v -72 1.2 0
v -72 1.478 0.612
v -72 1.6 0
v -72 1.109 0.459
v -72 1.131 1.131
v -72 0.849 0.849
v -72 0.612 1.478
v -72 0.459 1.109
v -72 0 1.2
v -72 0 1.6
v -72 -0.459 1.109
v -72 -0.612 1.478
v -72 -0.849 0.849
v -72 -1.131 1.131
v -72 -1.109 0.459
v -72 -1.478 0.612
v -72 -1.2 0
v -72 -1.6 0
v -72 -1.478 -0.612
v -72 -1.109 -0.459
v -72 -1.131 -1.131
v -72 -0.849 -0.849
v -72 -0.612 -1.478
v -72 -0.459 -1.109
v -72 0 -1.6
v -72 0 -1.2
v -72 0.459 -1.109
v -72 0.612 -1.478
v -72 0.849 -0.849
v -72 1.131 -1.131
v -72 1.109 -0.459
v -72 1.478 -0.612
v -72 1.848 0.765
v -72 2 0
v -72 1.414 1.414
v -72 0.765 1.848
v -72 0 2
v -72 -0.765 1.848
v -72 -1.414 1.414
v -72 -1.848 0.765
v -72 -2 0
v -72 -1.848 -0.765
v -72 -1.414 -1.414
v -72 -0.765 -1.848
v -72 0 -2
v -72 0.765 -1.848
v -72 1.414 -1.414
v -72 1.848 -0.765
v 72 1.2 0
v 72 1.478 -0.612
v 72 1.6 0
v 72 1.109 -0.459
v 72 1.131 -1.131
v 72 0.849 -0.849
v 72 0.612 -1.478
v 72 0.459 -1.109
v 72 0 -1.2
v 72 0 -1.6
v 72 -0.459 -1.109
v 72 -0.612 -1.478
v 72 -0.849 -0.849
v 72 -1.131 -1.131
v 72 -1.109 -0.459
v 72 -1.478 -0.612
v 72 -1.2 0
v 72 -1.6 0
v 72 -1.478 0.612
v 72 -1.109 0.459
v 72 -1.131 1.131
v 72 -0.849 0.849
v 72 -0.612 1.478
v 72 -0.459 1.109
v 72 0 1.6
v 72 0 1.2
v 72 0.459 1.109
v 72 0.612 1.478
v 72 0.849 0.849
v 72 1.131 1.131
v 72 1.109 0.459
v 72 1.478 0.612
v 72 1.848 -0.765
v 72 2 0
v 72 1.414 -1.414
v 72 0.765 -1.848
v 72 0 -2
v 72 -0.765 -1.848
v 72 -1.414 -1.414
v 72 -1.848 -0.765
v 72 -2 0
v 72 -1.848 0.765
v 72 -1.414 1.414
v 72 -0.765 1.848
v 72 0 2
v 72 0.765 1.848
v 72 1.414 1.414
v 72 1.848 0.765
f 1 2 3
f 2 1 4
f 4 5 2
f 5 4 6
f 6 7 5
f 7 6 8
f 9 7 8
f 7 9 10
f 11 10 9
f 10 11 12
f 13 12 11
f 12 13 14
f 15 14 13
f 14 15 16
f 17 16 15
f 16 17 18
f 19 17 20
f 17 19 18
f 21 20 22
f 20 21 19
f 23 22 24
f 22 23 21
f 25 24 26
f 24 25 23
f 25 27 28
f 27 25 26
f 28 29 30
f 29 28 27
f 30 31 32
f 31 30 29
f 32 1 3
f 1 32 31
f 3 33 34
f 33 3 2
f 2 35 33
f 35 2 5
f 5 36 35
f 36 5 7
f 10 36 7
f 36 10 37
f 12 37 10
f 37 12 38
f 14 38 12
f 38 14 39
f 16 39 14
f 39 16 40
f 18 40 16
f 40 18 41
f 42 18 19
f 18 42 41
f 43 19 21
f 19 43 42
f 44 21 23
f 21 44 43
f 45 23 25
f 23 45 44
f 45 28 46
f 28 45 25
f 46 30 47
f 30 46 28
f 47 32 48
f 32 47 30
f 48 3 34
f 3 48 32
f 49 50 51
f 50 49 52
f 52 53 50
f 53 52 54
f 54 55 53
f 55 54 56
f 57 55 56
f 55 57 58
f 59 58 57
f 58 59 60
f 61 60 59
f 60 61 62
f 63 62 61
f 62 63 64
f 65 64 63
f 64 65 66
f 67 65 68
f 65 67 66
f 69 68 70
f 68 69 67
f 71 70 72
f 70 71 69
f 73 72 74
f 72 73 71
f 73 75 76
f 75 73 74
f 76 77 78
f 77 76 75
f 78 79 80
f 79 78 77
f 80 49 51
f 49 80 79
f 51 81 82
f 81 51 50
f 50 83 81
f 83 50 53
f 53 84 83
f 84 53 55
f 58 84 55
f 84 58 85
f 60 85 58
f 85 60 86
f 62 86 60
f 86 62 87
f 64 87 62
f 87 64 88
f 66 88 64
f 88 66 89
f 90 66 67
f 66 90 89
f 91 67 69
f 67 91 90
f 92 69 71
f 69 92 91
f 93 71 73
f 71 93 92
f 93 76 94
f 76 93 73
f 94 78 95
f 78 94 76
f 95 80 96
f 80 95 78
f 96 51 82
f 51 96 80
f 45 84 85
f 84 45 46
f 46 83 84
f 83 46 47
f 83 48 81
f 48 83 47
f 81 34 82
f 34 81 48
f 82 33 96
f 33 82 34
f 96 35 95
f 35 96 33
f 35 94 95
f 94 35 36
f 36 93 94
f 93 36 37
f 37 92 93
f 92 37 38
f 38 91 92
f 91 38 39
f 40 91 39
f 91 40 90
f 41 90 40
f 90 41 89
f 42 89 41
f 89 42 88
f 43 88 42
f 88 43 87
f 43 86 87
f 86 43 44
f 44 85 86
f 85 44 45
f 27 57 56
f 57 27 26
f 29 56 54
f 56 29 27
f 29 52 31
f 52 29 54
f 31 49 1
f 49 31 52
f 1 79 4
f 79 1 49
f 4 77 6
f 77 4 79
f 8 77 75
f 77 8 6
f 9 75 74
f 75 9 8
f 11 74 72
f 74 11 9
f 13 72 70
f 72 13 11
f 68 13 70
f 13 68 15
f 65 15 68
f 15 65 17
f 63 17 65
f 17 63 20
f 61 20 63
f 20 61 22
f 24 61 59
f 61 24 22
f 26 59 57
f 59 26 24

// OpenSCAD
// file: ../p/4-4cyli.scad
use <../lib.scad>
function ldraw_lib__4_4cyli() = [
// 0 Cylinder 1.0
// 0 Name: 4-4cyli.dat
// 0 Author: James Jessiman
// 0 !LDRAW_ORG Primitive UPDATE 2005-01
// 0 !LICENSE Licensed under CC BY 4.0 : see CAreadme.txt
// 
// 0 BFC CERTIFY CCW
  [0,"BFC","CERTIFY"],
  [0,"BFC","CCW"],
// 
// 0 !HISTORY 1998-12-15 [PTadmin] Official Update 1998-10
// 0 !HISTORY 2002-03-23 [sbliss] Added BFC statement; merged headers from files in distributions LDraw 0.27 and Complete.
// 0 !HISTORY 2002-04-25 [PTadmin] Official Update 2002-02
// 0 !HISTORY 2004-12-14 [guyvivan] BFC CCW
// 0 !HISTORY 2005-12-28 [PTadmin] Official Update 2005-01
// 0 !HISTORY 2007-06-24 [PTadmin] Header formatted for Contributor Agreement
// 0 !HISTORY 2008-07-01 [PTadmin] Official Update 2008-01
// 
// 
// 4 16 1 1 0 0.9239 1 0.3827 0.9239 0 0.3827 1 0 0
  [4,16,1,1,0,0.9239,1,0.3827,0.9239,0,0.3827,1,0,0],
// 5 24 1 0 0 1 1 0 0.9239 0 0.3827 0.9239 0 -0.3827
  [5,24,1,0,0,1,1,0,0.9239,0,0.3827,0.9239,0,-0.3827],
// 4 16 0.9239 1 0.3827 0.7071 1 0.7071 0.7071 0 0.7071 0.9239 0 0.3827
  [4,16,0.9239,1,0.3827,0.7071,1,0.7071,0.7071,0,0.7071,0.9239,0,0.3827],
// 5 24 0.9239 0 0.3827 0.9239 1 0.3827 0.7071 0 0.7071 1 0 0
  [5,24,0.9239,0,0.3827,0.9239,1,0.3827,0.7071,0,0.7071,1,0,0],
// 4 16 0.7071 1 0.7071 0.3827 1 0.9239 0.3827 0 0.9239 0.7071 0 0.7071
  [4,16,0.7071,1,0.7071,0.3827,1,0.9239,0.3827,0,0.9239,0.7071,0,0.7071],
// 5 24 0.7071 0 0.7071 0.7071 1 0.7071 0.3827 0 0.9239 0.9239 0 0.3827
  [5,24,0.7071,0,0.7071,0.7071,1,0.7071,0.3827,0,0.9239,0.9239,0,0.3827],
// 4 16 0.3827 1 0.9239 0 1 1 0 0 1 0.3827 0 0.9239
  [4,16,0.3827,1,0.9239,0,1,1,0,0,1,0.3827,0,0.9239],
// 5 24 0.3827 0 0.9239 0.3827 1 0.9239 0 0 1 0.7071 0 0.7071
  [5,24,0.3827,0,0.9239,0.3827,1,0.9239,0,0,1,0.7071,0,0.7071],
// 4 16 0 1 1 -0.3827 1 0.9239 -0.3827 0 0.9239 0 0 1
  [4,16,0,1,1,-0.3827,1,0.9239,-0.3827,0,0.9239,0,0,1],
// 5 24 0 0 1 0 1 1 -0.3827 0 0.9239 0.3827 0 0.9239
  [5,24,0,0,1,0,1,1,-0.3827,0,0.9239,0.3827,0,0.9239],
// 4 16 -0.3827 1 0.9239 -0.7071 1 0.7071 -0.7071 0 0.7071 -0.3827 0 0.9239
  [4,16,-0.3827,1,0.9239,-0.7071,1,0.7071,-0.7071,0,0.7071,-0.3827,0,0.9239],
// 5 24 -0.3827 0 0.9239 -0.3827 1 0.9239 -0.7071 0 0.7071 0 0 1
  [5,24,-0.3827,0,0.9239,-0.3827,1,0.9239,-0.7071,0,0.7071,0,0,1],
// 4 16 -0.7071 1 0.7071 -0.9239 1 0.3827 -0.9239 0 0.3827 -0.7071 0 0.7071
  [4,16,-0.7071,1,0.7071,-0.9239,1,0.3827,-0.9239,0,0.3827,-0.7071,0,0.7071],
// 5 24 -0.7071 0 0.7071 -0.7071 1 0.7071 -0.9239 0 0.3827 -0.3827 0 0.9239
  [5,24,-0.7071,0,0.7071,-0.7071,1,0.7071,-0.9239,0,0.3827,-0.3827,0,0.9239],
// 4 16 -0.9239 1 0.3827 -1 1 0 -1 0 0 -0.9239 0 0.3827
  [4,16,-0.9239,1,0.3827,-1,1,0,-1,0,0,-0.9239,0,0.3827],
// 5 24 -0.9239 0 0.3827 -0.9239 1 0.3827 -1 0 0 -0.7071 0 0.7071
  [5,24,-0.9239,0,0.3827,-0.9239,1,0.3827,-1,0,0,-0.7071,0,0.7071],
// 4 16 -1 1 0 -0.9239 1 -0.3827 -0.9239 0 -0.3827 -1 0 0
  [4,16,-1,1,0,-0.9239,1,-0.3827,-0.9239,0,-0.3827,-1,0,0],
// 5 24 -1 0 0 -1 1 0 -0.9239 0 -0.3827 -0.9239 0 0.3827
  [5,24,-1,0,0,-1,1,0,-0.9239,0,-0.3827,-0.9239,0,0.3827],
// 4 16 -0.9239 1 -0.3827 -0.7071 1 -0.7071 -0.7071 0 -0.7071 -0.9239 0 -0.3827
  [4,16,-0.9239,1,-0.3827,-0.7071,1,-0.7071,-0.7071,0,-0.7071,-0.9239,0,-0.3827],
// 5 24 -0.9239 0 -0.3827 -0.9239 1 -0.3827 -0.7071 0 -0.7071 -1 0 0
  [5,24,-0.9239,0,-0.3827,-0.9239,1,-0.3827,-0.7071,0,-0.7071,-1,0,0],
// 4 16 -0.7071 1 -0.7071 -0.3827 1 -0.9239 -0.3827 0 -0.9239 -0.7071 0 -0.7071
  [4,16,-0.7071,1,-0.7071,-0.3827,1,-0.9239,-0.3827,0,-0.9239,-0.7071,0,-0.7071],
// 5 24 -0.7071 0 -0.7071 -0.7071 1 -0.7071 -0.3827 0 -0.9239 -0.9239 0 -0.3827
  [5,24,-0.7071,0,-0.7071,-0.7071,1,-0.7071,-0.3827,0,-0.9239,-0.9239,0,-0.3827],
// 4 16 -0.3827 1 -0.9239 0 1 -1 0 0 -1 -0.3827 0 -0.9239
  [4,16,-0.3827,1,-0.9239,0,1,-1,0,0,-1,-0.3827,0,-0.9239],
// 5 24 -0.3827 0 -0.9239 -0.3827 1 -0.9239 0 0 -1 -0.7071 0 -0.7071
  [5,24,-0.3827,0,-0.9239,-0.3827,1,-0.9239,0,0,-1,-0.7071,0,-0.7071],
// 4 16 0 1 -1 0.3827 1 -0.9239 0.3827 0 -0.9239 0 0 -1
  [4,16,0,1,-1,0.3827,1,-0.9239,0.3827,0,-0.9239,0,0,-1],
// 5 24 0 0 -1 0 1 -1 0.3827 0 -0.9239 -0.3827 0 -0.9239
  [5,24,0,0,-1,0,1,-1,0.3827,0,-0.9239,-0.3827,0,-0.9239],
// 4 16 0.3827 1 -0.9239 0.7071 1 -0.7071 0.7071 0 -0.7071 0.3827 0 -0.9239
  [4,16,0.3827,1,-0.9239,0.7071,1,-0.7071,0.7071,0,-0.7071,0.3827,0,-0.9239],
// 5 24 0.3827 0 -0.9239 0.3827 1 -0.9239 0.7071 0 -0.7071 0 0 -1
  [5,24,0.3827,0,-0.9239,0.3827,1,-0.9239,0.7071,0,-0.7071,0,0,-1],
// 4 16 0.7071 1 -0.7071 0.9239 1 -0.3827 0.9239 0 -0.3827 0.7071 0 -0.7071
  [4,16,0.7071,1,-0.7071,0.9239,1,-0.3827,0.9239,0,-0.3827,0.7071,0,-0.7071],
// 5 24 0.7071 0 -0.7071 0.7071 1 -0.7071 0.9239 0 -0.3827 0.3827 0 -0.9239
  [5,24,0.7071,0,-0.7071,0.7071,1,-0.7071,0.9239,0,-0.3827,0.3827,0,-0.9239],
// 4 16 0.9239 1 -0.3827 1 1 0 1 0 0 0.9239 0 -0.3827
  [4,16,0.9239,1,-0.3827,1,1,0,1,0,0,0.9239,0,-0.3827],
// 5 24 0.9239 0 -0.3827 0.9239 1 -0.3827 1 0 0 0.7071 0 -0.7071
  [5,24,0.9239,0,-0.3827,0.9239,1,-0.3827,1,0,0,0.7071,0,-0.7071],
// 0
];
module ldraw_lib__4_4cyli(step=0, col=false, unit=2/5, alt=false, line=0.2, solid=!$preview)
    makepoly(ldraw_lib__4_4cyli(), step=step, col=col, unit=unit, alt=alt, line=line, solid=solid);
ldraw_lib__4_4cyli(line=0.2);
// file: ../p/4-4ring4.scad
use <../lib.scad>
function ldraw_lib__4_4ring4() = [
// 0 Ring  4 x 1.0
// 0 Name: 4-4ring4.dat
// 0 Author: James Jessiman
// 0 !LDRAW_ORG Primitive UPDATE 2009-01
// 0 !LICENSE Licensed under CC BY 4.0 : see CAreadme.txt
// 
// 0 BFC CERTIFY CCW
  [0,"BFC","CERTIFY"],
  [0,"BFC","CCW"],
// 
// 0 !HISTORY 1998-12-15 [PTadmin] Official Update 1998-10
// 0 !HISTORY 2002-04-08 [BrickCaster] Modified for BFC compliance
// 0 !HISTORY 2002-04-25 [PTadmin] Official Update 2002-02
// 0 !HISTORY 2007-06-24 [PTadmin] Header formatted for Contributor Agreement
// 0 !HISTORY 2008-07-01 [PTadmin] Official Update 2008-01
// 0 !HISTORY 2008-08-26 [cwdee] Switch polygon winding and rename
// 0 !HISTORY 2009-05-02 [PTadmin] Official Update 2009-01
// 
// 
// 4 16 -1.9135 0 4.6195 -1.5308 0 3.6956 0 0 4 0 0 5
  [4,16,-1.9135,0,4.6195,-1.5308,0,3.6956,0,0,4,0,0,5],
// 4 16 -3.5355 0 3.5355 -2.8284 0 2.8284 -1.5308 0 3.6956 -1.9135 0 4.6195
  [4,16,-3.5355,0,3.5355,-2.8284,0,2.8284,-1.5308,0,3.6956,-1.9135,0,4.6195],
// 4 16 -4.6195 0 1.9135 -3.6956 0 1.5308 -2.8284 0 2.8284 -3.5355 0 3.5355
  [4,16,-4.6195,0,1.9135,-3.6956,0,1.5308,-2.8284,0,2.8284,-3.5355,0,3.5355],
// 4 16 -5 0 0 -4 0 0 -3.6956 0 1.5308 -4.6195 0 1.9135
  [4,16,-5,0,0,-4,0,0,-3.6956,0,1.5308,-4.6195,0,1.9135],
// 4 16 -4.6195 0 -1.9135 -3.6956 0 -1.5308 -4 0 0 -5 0 0
  [4,16,-4.6195,0,-1.9135,-3.6956,0,-1.5308,-4,0,0,-5,0,0],
// 4 16 -3.5355 0 -3.5355 -2.8284 0 -2.8284 -3.6956 0 -1.5308 -4.6195 0 -1.9135
  [4,16,-3.5355,0,-3.5355,-2.8284,0,-2.8284,-3.6956,0,-1.5308,-4.6195,0,-1.9135],
// 4 16 -1.9135 0 -4.6195 -1.5308 0 -3.6956 -2.8284 0 -2.8284 -3.5355 0 -3.5355
  [4,16,-1.9135,0,-4.6195,-1.5308,0,-3.6956,-2.8284,0,-2.8284,-3.5355,0,-3.5355],
// 4 16 0 0 -5 0 0 -4 -1.5308 0 -3.6956 -1.9135 0 -4.6195
  [4,16,0,0,-5,0,0,-4,-1.5308,0,-3.6956,-1.9135,0,-4.6195],
// 4 16 1.9135 0 -4.6195 1.5308 0 -3.6956 0 0 -4 0 0 -5
  [4,16,1.9135,0,-4.6195,1.5308,0,-3.6956,0,0,-4,0,0,-5],
// 4 16 3.5355 0 -3.5355 2.8284 0 -2.8284 1.5308 0 -3.6956 1.9135 0 -4.6195
  [4,16,3.5355,0,-3.5355,2.8284,0,-2.8284,1.5308,0,-3.6956,1.9135,0,-4.6195],
// 4 16 4.6195 0 -1.9135 3.6956 0 -1.5308 2.8284 0 -2.8284 3.5355 0 -3.5355
  [4,16,4.6195,0,-1.9135,3.6956,0,-1.5308,2.8284,0,-2.8284,3.5355,0,-3.5355],
// 4 16 5 0 0 4 0 0 3.6956 0 -1.5308 4.6195 0 -1.9135
  [4,16,5,0,0,4,0,0,3.6956,0,-1.5308,4.6195,0,-1.9135],
// 4 16 4.6195 0 1.9135 3.6956 0 1.5308 4 0 0 5 0 0
  [4,16,4.6195,0,1.9135,3.6956,0,1.5308,4,0,0,5,0,0],
// 4 16 3.5355 0 3.5355 2.8284 0 2.8284 3.6956 0 1.5308 4.6195 0 1.9135
  [4,16,3.5355,0,3.5355,2.8284,0,2.8284,3.6956,0,1.5308,4.6195,0,1.9135],
// 4 16 1.9135 0 4.6195 1.5308 0 3.6956 2.8284 0 2.8284 3.5355 0 3.5355
  [4,16,1.9135,0,4.6195,1.5308,0,3.6956,2.8284,0,2.8284,3.5355,0,3.5355],
// 4 16 0 0 5 0 0 4 1.5308 0 3.6956 1.9135 0 4.6195
  [4,16,0,0,5,0,0,4,1.5308,0,3.6956,1.9135,0,4.6195],
// 0
];
module ldraw_lib__4_4ring4(step=0, col=false, unit=2/5, alt=false, line=0.2, solid=!$preview)
    makepoly(ldraw_lib__4_4ring4(), step=step, col=col, unit=unit, alt=alt, line=line, solid=solid);
ldraw_lib__4_4ring4(line=0.2);
// file: ../p/4-4ring3.scad
use <../lib.scad>
function ldraw_lib__4_4ring3() = [
// 0 Ring  3 x 1.0
// 0 Name: 4-4ring3.dat
// 0 Author: James Jessiman
// 0 !LDRAW_ORG Primitive UPDATE 2009-01
// 0 !LICENSE Licensed under CC BY 4.0 : see CAreadme.txt
// 
// 0 BFC CERTIFY CCW
  [0,"BFC","CERTIFY"],
  [0,"BFC","CCW"],
// 
// 0 !HISTORY 1998-12-15 [PTadmin] Official Update 1998-10
// 0 !HISTORY 2002-04-05 [hafhead] Added BFC statement
// 0 !HISTORY 2002-04-25 [PTadmin] Official Update 2002-02
// 0 !HISTORY 2007-06-24 [PTadmin] Header formatted for Contributor Agreement
// 0 !HISTORY 2008-07-01 [PTadmin] Official Update 2008-01
// 0 !HISTORY 2008-08-26 [cwdee] Switch polygon winding and rename
// 0 !HISTORY 2009-05-02 [PTadmin] Official Update 2009-01
// 
// 
// 4 16 -1.5308 0 3.6956 -1.1481 0 2.7717 0 0 3 0 0 4
  [4,16,-1.5308,0,3.6956,-1.1481,0,2.7717,0,0,3,0,0,4],
// 4 16 -2.8284 0 2.8284 -2.1213 0 2.1213 -1.1481 0 2.7717 -1.5308 0 3.6956
  [4,16,-2.8284,0,2.8284,-2.1213,0,2.1213,-1.1481,0,2.7717,-1.5308,0,3.6956],
// 4 16 -3.6956 0 1.5308 -2.7717 0 1.1481 -2.1213 0 2.1213 -2.8284 0 2.8284
  [4,16,-3.6956,0,1.5308,-2.7717,0,1.1481,-2.1213,0,2.1213,-2.8284,0,2.8284],
// 4 16 -4 0 0 -3 0 0 -2.7717 0 1.1481 -3.6956 0 1.5308
  [4,16,-4,0,0,-3,0,0,-2.7717,0,1.1481,-3.6956,0,1.5308],
// 4 16 -3.6956 0 -1.5308 -2.7717 0 -1.1481 -3 0 0 -4 0 0
  [4,16,-3.6956,0,-1.5308,-2.7717,0,-1.1481,-3,0,0,-4,0,0],
// 4 16 -2.8284 0 -2.8284 -2.1213 0 -2.1213 -2.7717 0 -1.1481 -3.6956 0 -1.5308
  [4,16,-2.8284,0,-2.8284,-2.1213,0,-2.1213,-2.7717,0,-1.1481,-3.6956,0,-1.5308],
// 4 16 -1.5308 0 -3.6956 -1.1481 0 -2.7717 -2.1213 0 -2.1213 -2.8284 0 -2.8284
  [4,16,-1.5308,0,-3.6956,-1.1481,0,-2.7717,-2.1213,0,-2.1213,-2.8284,0,-2.8284],
// 4 16 0 0 -4 0 0 -3 -1.1481 0 -2.7717 -1.5308 0 -3.6956
  [4,16,0,0,-4,0,0,-3,-1.1481,0,-2.7717,-1.5308,0,-3.6956],
// 4 16 1.5308 0 -3.6956 1.1481 0 -2.7717 0 0 -3 0 0 -4
  [4,16,1.5308,0,-3.6956,1.1481,0,-2.7717,0,0,-3,0,0,-4],
// 4 16 2.8284 0 -2.8284 2.1213 0 -2.1213 1.1481 0 -2.7717 1.5308 0 -3.6956
  [4,16,2.8284,0,-2.8284,2.1213,0,-2.1213,1.1481,0,-2.7717,1.5308,0,-3.6956],
// 4 16 3.6956 0 -1.5308 2.7717 0 -1.1481 2.1213 0 -2.1213 2.8284 0 -2.8284
  [4,16,3.6956,0,-1.5308,2.7717,0,-1.1481,2.1213,0,-2.1213,2.8284,0,-2.8284],
// 4 16 4 0 0 3 0 0 2.7717 0 -1.1481 3.6956 0 -1.5308
  [4,16,4,0,0,3,0,0,2.7717,0,-1.1481,3.6956,0,-1.5308],
// 4 16 3.6956 0 1.5308 2.7717 0 1.1481 3 0 0 4 0 0
  [4,16,3.6956,0,1.5308,2.7717,0,1.1481,3,0,0,4,0,0],
// 4 16 2.8284 0 2.8284 2.1213 0 2.1213 2.7717 0 1.1481 3.6956 0 1.5308
  [4,16,2.8284,0,2.8284,2.1213,0,2.1213,2.7717,0,1.1481,3.6956,0,1.5308],
// 4 16 1.5308 0 3.6956 1.1481 0 2.7717 2.1213 0 2.1213 2.8284 0 2.8284
  [4,16,1.5308,0,3.6956,1.1481,0,2.7717,2.1213,0,2.1213,2.8284,0,2.8284],
// 4 16 0 0 4 0 0 3 1.1481 0 2.7717 1.5308 0 3.6956
  [4,16,0,0,4,0,0,3,1.1481,0,2.7717,1.5308,0,3.6956],
// 0
];
module ldraw_lib__4_4ring3(step=0, col=false, unit=2/5, alt=false, line=0.2, solid=!$preview)
    makepoly(ldraw_lib__4_4ring3(), step=step, col=col, unit=unit, alt=alt, line=line, solid=solid);
ldraw_lib__4_4ring3(line=0.2);
// file: ../p/4-4edge.scad
use <../lib.scad>
function ldraw_lib__4_4edge() = [
// 0 Circle 1.0
// 0 Name: 4-4edge.dat
// 0 Author: James Jessiman
// 0 !LDRAW_ORG Primitive UPDATE 2017-01
// 0 !LICENSE Licensed under CC BY 4.0 : see CAreadme.txt
// 
// 0 BFC CERTIFY CCW
  [0,"BFC","CERTIFY"],
  [0,"BFC","CCW"],
// 
// 0 !HISTORY 1998-12-15 [PTadmin] Official Update 1998-10
// 0 !HISTORY 2005-12-28 [PTadmin] Official Update 2005-01
// 0 !HISTORY 2007-06-24 [PTadmin] Header formatted for Contributor Agreement
// 0 !HISTORY 2008-07-01 [PTadmin] Official Update 2008-01
// 0 !HISTORY 2017-01-15 [Steffen] BFCed
// 0 !HISTORY 2017-12-30 [PTadmin] Official Update 2017-01
// 
// 
// 2 24 1 0 0 0.9239 0 0.3827
  [2,24,1,0,0,0.9239,0,0.3827],
// 2 24 0.9239 0 0.3827 0.7071 0 0.7071
  [2,24,0.9239,0,0.3827,0.7071,0,0.7071],
// 2 24 0.7071 0 0.7071 0.3827 0 0.9239
  [2,24,0.7071,0,0.7071,0.3827,0,0.9239],
// 2 24 0.3827 0 0.9239 0 0 1
  [2,24,0.3827,0,0.9239,0,0,1],
// 2 24 0 0 1 -0.3827 0 0.9239
  [2,24,0,0,1,-0.3827,0,0.9239],
// 2 24 -0.3827 0 0.9239 -0.7071 0 0.7071
  [2,24,-0.3827,0,0.9239,-0.7071,0,0.7071],
// 2 24 -0.7071 0 0.7071 -0.9239 0 0.3827
  [2,24,-0.7071,0,0.7071,-0.9239,0,0.3827],
// 2 24 -0.9239 0 0.3827 -1 0 -0
  [2,24,-0.9239,0,0.3827,-1,0,-0],
// 2 24 -1 0 -0 -0.9239 0 -0.3827
  [2,24,-1,0,-0,-0.9239,0,-0.3827],
// 2 24 -0.9239 0 -0.3827 -0.7071 0 -0.7071
  [2,24,-0.9239,0,-0.3827,-0.7071,0,-0.7071],
// 2 24 -0.7071 0 -0.7071 -0.3827 0 -0.9239
  [2,24,-0.7071,0,-0.7071,-0.3827,0,-0.9239],
// 2 24 -0.3827 0 -0.9239 0 0 -1
  [2,24,-0.3827,0,-0.9239,0,0,-1],
// 2 24 0 0 -1 0.3827 0 -0.9239
  [2,24,0,0,-1,0.3827,0,-0.9239],
// 2 24 0.3827 0 -0.9239 0.7071 0 -0.7071
  [2,24,0.3827,0,-0.9239,0.7071,0,-0.7071],
// 2 24 0.7071 0 -0.7071 0.9239 0 -0.3827
  [2,24,0.7071,0,-0.7071,0.9239,0,-0.3827],
// 2 24 0.9239 0 -0.3827 1 0 0
  [2,24,0.9239,0,-0.3827,1,0,0],
];
module ldraw_lib__4_4edge(step=0, col=false, unit=2/5, alt=false, line=0.2, solid=!$preview)
    makepoly(ldraw_lib__4_4edge(), step=step, col=col, unit=unit, alt=alt, line=line, solid=solid);
ldraw_lib__4_4edge(line=0.2);
// file: 71533k03.scad
use <../lib.scad>
use <../p/4-4cyli.scad>
function ldraw_lib__71533k03() = [
// 0 ~Technic Pneumatic Tube Segment
// 0 Name: 71533k03.dat
// 0 Author: Jaco van der Molen [Jaco]
// 0 !LDRAW_ORG Part Flexible_Section UPDATE 2020-01
// 0 !LICENSE Licensed under CC BY 4.0 : see CAreadme.txt
// 
// 0 BFC CERTIFY CW
  [0,"BFC","CERTIFY"],
  [0,"BFC","CW"],
// 
// 0 !HISTORY 2003-11-30 [Steffen] BFCed
// 0 !HISTORY 2009-12-29 [PTadmin] Official Update 2009-03
// 0 !HISTORY 2020-06-27 [PTadmin] Renamed from 166
// 0 !HISTORY 2020-06-28 [PTadmin] Official Update 2020-01
// 
// 
// 1 16 0 0 0 5 0 0 0 1 0 0 0 5 4-4cyli.dat
  [1,16,0,0,0,5,0,0,0,1,0,0,0,5, ldraw_lib__4_4cyli()],
// 0 BFC INVERTNEXT
  [0,"BFC","INVERTNEXT"],
// 1 16 0 0 0 3 0 0 0 1 0 0 0 3 4-4cyli.dat
  [1,16,0,0,0,3,0,0,0,1,0,0,0,3, ldraw_lib__4_4cyli()],
// 0
];
module ldraw_lib__71533k03(step=0, col=false, unit=2/5, alt=false, line=0.2, solid=!$preview)
    makepoly(ldraw_lib__71533k03(), step=step, col=col, unit=unit, alt=alt, line=line, solid=solid);
ldraw_lib__71533k03(line=0.2);
// file: 71533k02.scad
use <../lib.scad>
use <../p/4-4edge.scad>
use <../p/4-4ring3.scad>
use <../p/4-4ring4.scad>
function ldraw_lib__71533k02() = [
// 0 ~Technic Pneumatic Tube End (Non-Bulged)
// 0 Name: 71533k02.dat
// 0 Author: Steffen [Steffen]
// 0 !LDRAW_ORG Part Flexible_Section UPDATE 2020-01
// 0 !LICENSE Licensed under CC BY 4.0 : see CAreadme.txt
// 
// 0 BFC CERTIFY CCW
  [0,"BFC","CERTIFY"],
  [0,"BFC","CCW"],
// 
// 0 !HISTORY 2020-06-28 [PTadmin] Official Update 2020-01
// 
// 
// 0 // This file goes together with 71533k01.dat and 71533k03.dat.
// 0 // Those 3 files can be used to create Technic Pneumatic Tubes
// 0 // with either bulged or non-bulged ends.
// 
// 1 16 0 0 0 1 0 0 0 1 0 0 0 1 4-4ring3.dat
  [1,16,0,0,0,1,0,0,0,1,0,0,0,1, ldraw_lib__4_4ring3()],
// 1 16 0 0 0 1 0 0 0 1 0 0 0 1 4-4ring4.dat
  [1,16,0,0,0,1,0,0,0,1,0,0,0,1, ldraw_lib__4_4ring4()],
// 1 16 0 0 0 3 0 0 0 3 0 0 0 3 4-4edge.dat
  [1,16,0,0,0,3,0,0,0,3,0,0,0,3, ldraw_lib__4_4edge()],
// 1 16 0 0 0 5 0 0 0 5 0 0 0 5 4-4edge.dat
  [1,16,0,0,0,5,0,0,0,5,0,0,0,5, ldraw_lib__4_4edge()],
];
module ldraw_lib__71533k02(step=0, col=false, unit=2/5, alt=false, line=0.2, solid=!$preview)
    makepoly(ldraw_lib__71533k02(), step=step, col=col, unit=unit, alt=alt, line=line, solid=solid);
ldraw_lib__71533k02(line=0.2);
// main file
use <../lib.scad>
use <71533k02.scad>
use <71533k03.scad>
function ldraw_lib__1661_f1() = [
// 0 Technic Pneumatic Tube 18L
// 0 Name: 1661-f1.dat
// 0 Author: Johann Eisner [technicbasics]
// 0 !LDRAW_ORG Part UPDATE 2025-05
// 0 !LICENSE Licensed under CC BY 4.0 : see CAreadme.txt
// 
// 0 BFC CERTIFY CCW
  [0,"BFC","CERTIFY"],
  [0,"BFC","CCW"],
// 
// 0 !KEYWORDS 144 mm, BrickLink 1661, Rebrickable 5102c18
// 
// 0 !HISTORY 2025-05-28 [OrionP] Official Update 2025-05
// 
// 1 16 -180 0 0 0 1 0 1 0 0 0 0 1 71533k02.dat
  [1,16,-180,0,0,0,1,0,1,0,0,0,0,1, ldraw_lib__71533k02()],
// 1 16 180 0 0 0 -1 0 -1 0 0 0 0 1 71533k02.dat
  [1,16,180,0,0,0,-1,0,-1,0,0,0,0,1, ldraw_lib__71533k02()],
// 1 16 -180 0 0 0 360 0 1 0 0 0 0 1 71533k03.dat
  [1,16,-180,0,0,0,360,0,1,0,0,0,0,1, ldraw_lib__71533k03()],
];
module ldraw_lib__1661_f1(step=0, col=false, unit=2/5, alt=false, line=0.2, solid=!$preview)
    makepoly(ldraw_lib__1661_f1(), step=step, col=col, unit=unit, alt=alt, line=line, solid=solid);
ldraw_lib__1661_f1(line=0.2);
